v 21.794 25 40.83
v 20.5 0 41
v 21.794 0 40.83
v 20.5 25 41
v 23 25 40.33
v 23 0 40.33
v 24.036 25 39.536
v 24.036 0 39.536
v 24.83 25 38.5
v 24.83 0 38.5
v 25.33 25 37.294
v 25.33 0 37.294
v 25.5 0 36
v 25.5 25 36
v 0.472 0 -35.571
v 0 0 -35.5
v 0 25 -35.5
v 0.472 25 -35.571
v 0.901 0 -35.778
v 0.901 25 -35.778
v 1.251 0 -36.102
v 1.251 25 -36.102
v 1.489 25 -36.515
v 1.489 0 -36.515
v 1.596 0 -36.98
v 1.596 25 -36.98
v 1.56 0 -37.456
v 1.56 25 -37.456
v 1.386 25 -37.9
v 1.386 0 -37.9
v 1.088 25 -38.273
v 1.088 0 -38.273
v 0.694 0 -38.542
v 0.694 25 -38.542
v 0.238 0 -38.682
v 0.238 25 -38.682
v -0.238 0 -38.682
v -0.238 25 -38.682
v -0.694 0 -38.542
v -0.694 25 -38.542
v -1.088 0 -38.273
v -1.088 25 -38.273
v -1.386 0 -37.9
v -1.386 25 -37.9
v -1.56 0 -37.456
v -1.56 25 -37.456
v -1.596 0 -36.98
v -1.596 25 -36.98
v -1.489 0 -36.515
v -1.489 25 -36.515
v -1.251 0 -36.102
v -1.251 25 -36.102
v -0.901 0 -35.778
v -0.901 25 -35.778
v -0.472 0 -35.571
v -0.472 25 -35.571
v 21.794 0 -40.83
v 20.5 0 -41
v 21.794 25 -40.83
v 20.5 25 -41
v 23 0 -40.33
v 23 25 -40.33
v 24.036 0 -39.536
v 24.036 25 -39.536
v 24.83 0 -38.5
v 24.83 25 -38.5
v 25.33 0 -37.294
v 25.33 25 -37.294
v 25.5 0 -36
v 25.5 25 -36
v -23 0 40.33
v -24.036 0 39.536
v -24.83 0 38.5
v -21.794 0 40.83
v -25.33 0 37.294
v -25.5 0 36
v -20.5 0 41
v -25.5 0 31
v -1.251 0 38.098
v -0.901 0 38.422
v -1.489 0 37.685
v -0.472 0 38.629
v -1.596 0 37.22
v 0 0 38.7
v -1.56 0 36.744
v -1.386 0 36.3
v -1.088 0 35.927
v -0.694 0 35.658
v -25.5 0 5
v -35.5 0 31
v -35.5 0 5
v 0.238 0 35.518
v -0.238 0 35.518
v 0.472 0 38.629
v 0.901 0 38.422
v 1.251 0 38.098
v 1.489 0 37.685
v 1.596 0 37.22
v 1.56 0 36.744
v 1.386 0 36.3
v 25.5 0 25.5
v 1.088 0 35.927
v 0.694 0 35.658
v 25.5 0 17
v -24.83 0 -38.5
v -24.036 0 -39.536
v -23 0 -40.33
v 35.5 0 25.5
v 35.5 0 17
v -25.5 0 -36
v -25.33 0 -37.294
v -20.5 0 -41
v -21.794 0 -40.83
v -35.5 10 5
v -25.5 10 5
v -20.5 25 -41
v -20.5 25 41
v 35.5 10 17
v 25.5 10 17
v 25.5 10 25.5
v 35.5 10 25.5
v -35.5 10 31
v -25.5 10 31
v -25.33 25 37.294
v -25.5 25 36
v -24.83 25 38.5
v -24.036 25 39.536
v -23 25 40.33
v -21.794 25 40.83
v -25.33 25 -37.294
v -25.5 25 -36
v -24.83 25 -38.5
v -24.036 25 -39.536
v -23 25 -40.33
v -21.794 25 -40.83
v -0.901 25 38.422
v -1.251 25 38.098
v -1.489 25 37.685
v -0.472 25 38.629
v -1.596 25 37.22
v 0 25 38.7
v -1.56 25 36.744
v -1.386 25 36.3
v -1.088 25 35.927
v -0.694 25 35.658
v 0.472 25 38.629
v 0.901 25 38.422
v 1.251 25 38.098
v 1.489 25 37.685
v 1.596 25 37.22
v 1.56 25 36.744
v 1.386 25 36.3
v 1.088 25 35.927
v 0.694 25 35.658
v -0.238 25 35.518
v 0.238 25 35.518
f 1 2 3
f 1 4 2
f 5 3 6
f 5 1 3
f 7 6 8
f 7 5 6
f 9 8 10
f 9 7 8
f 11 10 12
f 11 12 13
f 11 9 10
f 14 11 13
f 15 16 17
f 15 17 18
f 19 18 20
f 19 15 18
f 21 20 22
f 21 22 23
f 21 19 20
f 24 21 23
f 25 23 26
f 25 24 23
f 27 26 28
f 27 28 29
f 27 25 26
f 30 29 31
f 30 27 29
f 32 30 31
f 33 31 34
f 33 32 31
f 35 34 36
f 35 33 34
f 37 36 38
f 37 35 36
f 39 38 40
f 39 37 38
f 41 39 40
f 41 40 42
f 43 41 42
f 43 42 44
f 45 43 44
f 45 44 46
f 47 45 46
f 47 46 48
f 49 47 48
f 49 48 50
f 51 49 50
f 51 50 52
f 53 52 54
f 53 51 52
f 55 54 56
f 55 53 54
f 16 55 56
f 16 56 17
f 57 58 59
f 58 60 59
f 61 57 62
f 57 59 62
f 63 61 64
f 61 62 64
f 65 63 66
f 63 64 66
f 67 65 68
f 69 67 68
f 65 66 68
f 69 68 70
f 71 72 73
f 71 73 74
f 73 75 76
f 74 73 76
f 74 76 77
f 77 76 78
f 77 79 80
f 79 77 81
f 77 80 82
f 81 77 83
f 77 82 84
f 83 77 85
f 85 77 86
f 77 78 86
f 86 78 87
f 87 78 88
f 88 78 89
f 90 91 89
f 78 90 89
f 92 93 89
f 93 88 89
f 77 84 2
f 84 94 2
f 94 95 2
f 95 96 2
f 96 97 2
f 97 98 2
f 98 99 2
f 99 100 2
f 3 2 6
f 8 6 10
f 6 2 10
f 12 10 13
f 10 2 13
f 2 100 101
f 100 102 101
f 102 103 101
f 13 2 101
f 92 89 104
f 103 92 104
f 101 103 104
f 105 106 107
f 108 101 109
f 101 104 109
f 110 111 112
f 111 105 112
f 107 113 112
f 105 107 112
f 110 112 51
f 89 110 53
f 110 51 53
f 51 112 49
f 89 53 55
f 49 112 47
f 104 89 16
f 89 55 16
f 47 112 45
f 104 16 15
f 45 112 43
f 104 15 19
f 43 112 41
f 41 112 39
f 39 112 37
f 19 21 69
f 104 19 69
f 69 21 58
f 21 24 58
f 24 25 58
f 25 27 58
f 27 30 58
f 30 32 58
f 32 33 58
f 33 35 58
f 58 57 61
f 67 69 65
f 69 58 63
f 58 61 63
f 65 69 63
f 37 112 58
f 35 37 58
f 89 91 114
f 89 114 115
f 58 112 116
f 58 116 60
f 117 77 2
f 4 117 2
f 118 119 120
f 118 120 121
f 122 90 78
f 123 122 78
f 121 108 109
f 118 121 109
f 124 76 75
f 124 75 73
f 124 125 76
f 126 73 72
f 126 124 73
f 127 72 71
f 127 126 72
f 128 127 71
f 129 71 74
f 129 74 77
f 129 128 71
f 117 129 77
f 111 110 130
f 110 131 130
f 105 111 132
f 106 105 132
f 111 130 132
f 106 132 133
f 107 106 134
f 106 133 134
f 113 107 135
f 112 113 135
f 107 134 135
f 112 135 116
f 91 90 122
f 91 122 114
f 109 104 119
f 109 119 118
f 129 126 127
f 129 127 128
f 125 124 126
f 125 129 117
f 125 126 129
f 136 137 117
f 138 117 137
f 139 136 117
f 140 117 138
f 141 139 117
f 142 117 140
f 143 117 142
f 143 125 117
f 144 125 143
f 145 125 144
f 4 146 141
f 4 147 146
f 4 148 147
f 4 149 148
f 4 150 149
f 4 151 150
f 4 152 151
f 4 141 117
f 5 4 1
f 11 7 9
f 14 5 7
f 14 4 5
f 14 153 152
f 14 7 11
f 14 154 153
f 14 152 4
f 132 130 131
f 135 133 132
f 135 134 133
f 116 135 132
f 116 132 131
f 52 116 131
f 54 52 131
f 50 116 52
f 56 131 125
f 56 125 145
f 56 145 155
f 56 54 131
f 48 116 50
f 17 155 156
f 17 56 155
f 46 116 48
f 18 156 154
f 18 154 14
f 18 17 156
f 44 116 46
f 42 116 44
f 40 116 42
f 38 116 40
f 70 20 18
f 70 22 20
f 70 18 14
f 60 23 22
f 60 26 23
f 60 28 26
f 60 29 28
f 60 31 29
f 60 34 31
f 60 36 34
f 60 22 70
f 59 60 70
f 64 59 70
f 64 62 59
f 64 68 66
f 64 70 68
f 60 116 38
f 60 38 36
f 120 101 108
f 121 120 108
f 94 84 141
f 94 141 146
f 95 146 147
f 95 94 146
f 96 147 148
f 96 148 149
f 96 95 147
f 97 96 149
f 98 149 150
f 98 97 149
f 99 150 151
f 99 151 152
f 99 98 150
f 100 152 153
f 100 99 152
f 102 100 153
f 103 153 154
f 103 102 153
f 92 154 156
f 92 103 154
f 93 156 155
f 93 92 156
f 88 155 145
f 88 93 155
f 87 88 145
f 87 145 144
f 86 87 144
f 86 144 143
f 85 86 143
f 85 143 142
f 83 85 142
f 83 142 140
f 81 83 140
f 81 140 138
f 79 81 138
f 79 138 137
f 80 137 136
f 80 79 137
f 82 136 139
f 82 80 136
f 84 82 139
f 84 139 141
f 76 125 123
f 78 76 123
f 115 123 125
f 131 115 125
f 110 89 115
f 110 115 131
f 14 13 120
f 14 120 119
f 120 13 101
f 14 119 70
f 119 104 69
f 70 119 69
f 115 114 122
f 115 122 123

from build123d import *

# Parameters (mm, degrees)
SKETCH1_R           = 1.6
BOSS_EXTRUDE1_DEPTH = 25
SKETCH1_3_W         = 10
SKETCH1_3_H         = 26
SKETCH1_3_H_2       = 8.5
BOSS_EXTRUDE2_DEPTH = 10
FILLET1_R           = 5


with BuildPart() as part:
    # Sketch1 → Boss-Extrude1 (new body)
    with BuildSketch(Plane(origin=(0, 0, 0), x_dir=(1, 0, 0), z_dir=(0, 1, 0))):
        Polygon((-25.5, -31), (-25.5, -41), (25.5, -41), (25.5, -25.5), (25.5, -17), (25.5, 41), (-25.5, 41), (-25.5, -5), align=None)
        with Locations((0, -37.1)):
            Circle(SKETCH1_R, mode=Mode.SUBTRACT)
        with Locations((0, 37.1)):
            Circle(SKETCH1_R, mode=Mode.SUBTRACT)
    extrude(amount=BOSS_EXTRUDE1_DEPTH)

    # Sketch1<3> → Boss-Extrude2 (add)
    with BuildSketch(Plane(origin=(0, 0, 0), x_dir=(1, 0, 0), z_dir=(0, 1, 0))):
        with Locations((-30.5, -18)):
            Rectangle(SKETCH1_3_W, SKETCH1_3_H)
        with Locations((30.5, -21.25)):
            Rectangle(SKETCH1_3_W, SKETCH1_3_H_2)
    extrude(amount=BOSS_EXTRUDE2_DEPTH)

    # Fillet1
    fillet1_edges = [part.edges().sort_by_distance(p)[0] for p in [
        (-25.5, 12.5, -41),
        (25.5, 12.5, -41),
        (25.5, 12.5, 41),
        (-25.5, 12.5, 41),
    ]]
    fillet(fillet1_edges, radius=FILLET1_R)


solid = part.part
